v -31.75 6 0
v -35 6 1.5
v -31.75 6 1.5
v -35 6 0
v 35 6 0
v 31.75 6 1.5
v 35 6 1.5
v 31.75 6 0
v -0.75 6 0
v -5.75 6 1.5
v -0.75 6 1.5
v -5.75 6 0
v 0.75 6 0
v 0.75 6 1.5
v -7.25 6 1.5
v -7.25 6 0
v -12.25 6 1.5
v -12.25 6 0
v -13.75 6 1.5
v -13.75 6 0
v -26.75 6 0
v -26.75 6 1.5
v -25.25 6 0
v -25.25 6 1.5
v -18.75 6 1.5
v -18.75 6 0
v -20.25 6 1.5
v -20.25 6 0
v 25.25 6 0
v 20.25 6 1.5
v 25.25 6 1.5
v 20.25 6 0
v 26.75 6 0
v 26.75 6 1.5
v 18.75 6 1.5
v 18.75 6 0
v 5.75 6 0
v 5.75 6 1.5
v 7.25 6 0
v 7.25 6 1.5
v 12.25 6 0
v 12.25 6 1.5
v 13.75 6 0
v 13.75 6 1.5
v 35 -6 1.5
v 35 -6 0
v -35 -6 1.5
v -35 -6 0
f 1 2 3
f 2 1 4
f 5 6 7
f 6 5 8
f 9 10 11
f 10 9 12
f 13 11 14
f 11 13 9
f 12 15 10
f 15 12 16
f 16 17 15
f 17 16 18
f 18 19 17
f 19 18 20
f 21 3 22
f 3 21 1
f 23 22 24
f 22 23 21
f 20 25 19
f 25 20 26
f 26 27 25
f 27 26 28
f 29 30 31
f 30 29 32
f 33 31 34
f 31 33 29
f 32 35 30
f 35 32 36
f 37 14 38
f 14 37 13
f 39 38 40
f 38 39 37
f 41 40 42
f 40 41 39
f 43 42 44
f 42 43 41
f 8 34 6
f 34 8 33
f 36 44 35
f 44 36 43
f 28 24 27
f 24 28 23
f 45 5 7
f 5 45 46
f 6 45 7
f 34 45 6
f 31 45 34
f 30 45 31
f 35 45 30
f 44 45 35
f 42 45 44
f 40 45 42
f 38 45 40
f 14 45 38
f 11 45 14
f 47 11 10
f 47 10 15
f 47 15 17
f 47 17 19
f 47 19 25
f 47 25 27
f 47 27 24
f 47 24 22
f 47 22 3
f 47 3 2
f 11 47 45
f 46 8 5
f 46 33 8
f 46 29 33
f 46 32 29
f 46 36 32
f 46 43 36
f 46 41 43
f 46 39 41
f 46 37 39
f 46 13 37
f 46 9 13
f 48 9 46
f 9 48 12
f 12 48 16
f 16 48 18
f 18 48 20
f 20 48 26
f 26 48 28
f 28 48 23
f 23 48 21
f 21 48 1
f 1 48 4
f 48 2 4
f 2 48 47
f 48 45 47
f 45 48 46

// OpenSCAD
// 10-well comb for casting agarose gels, printed lying flat
// Units: mm

// ---- Spine ----
spine_len   = 70;   // spine length along X
spine_wid   = 12;   // spine width along Y
plate_thk   = 1.5;  // plate thickness along Z

// ---- Teeth ----
tooth_count = 10;   // number of teeth
tooth_w     = 5.0;  // tooth width along X
tooth_len   = 12;   // tooth length along Y (overlaps spine)
gap         = 1.5;  // gap between neighbouring teeth

// ---- Misc ----
eps         = 0.5;  // cutter overshoot past faces
$fn         = 64;   // curve resolution

// Derived values
pitch       = tooth_w + gap;                 // centre-to-centre tooth spacing
row_offset  = -(tooth_count - 1) * pitch / 2; // centre the row on the origin

difference() {
    // Base plate (spine + small overlap into teeth region)
    translate([-spine_len / 2, -spine_wid / 2, 0])
        cube([spine_len, spine_wid, plate_thk]);

    // Teeth, hanging from the +Y edge of the spine, in the -Y direction
    for (i = [0 : tooth_count - 1]) {
        translate([row_offset + i * pitch - tooth_w / 2,
                   spine_wid / 2,
                   0])
            cube([tooth_w, tooth_len + eps, plate_thk + eps]);
    }
}
